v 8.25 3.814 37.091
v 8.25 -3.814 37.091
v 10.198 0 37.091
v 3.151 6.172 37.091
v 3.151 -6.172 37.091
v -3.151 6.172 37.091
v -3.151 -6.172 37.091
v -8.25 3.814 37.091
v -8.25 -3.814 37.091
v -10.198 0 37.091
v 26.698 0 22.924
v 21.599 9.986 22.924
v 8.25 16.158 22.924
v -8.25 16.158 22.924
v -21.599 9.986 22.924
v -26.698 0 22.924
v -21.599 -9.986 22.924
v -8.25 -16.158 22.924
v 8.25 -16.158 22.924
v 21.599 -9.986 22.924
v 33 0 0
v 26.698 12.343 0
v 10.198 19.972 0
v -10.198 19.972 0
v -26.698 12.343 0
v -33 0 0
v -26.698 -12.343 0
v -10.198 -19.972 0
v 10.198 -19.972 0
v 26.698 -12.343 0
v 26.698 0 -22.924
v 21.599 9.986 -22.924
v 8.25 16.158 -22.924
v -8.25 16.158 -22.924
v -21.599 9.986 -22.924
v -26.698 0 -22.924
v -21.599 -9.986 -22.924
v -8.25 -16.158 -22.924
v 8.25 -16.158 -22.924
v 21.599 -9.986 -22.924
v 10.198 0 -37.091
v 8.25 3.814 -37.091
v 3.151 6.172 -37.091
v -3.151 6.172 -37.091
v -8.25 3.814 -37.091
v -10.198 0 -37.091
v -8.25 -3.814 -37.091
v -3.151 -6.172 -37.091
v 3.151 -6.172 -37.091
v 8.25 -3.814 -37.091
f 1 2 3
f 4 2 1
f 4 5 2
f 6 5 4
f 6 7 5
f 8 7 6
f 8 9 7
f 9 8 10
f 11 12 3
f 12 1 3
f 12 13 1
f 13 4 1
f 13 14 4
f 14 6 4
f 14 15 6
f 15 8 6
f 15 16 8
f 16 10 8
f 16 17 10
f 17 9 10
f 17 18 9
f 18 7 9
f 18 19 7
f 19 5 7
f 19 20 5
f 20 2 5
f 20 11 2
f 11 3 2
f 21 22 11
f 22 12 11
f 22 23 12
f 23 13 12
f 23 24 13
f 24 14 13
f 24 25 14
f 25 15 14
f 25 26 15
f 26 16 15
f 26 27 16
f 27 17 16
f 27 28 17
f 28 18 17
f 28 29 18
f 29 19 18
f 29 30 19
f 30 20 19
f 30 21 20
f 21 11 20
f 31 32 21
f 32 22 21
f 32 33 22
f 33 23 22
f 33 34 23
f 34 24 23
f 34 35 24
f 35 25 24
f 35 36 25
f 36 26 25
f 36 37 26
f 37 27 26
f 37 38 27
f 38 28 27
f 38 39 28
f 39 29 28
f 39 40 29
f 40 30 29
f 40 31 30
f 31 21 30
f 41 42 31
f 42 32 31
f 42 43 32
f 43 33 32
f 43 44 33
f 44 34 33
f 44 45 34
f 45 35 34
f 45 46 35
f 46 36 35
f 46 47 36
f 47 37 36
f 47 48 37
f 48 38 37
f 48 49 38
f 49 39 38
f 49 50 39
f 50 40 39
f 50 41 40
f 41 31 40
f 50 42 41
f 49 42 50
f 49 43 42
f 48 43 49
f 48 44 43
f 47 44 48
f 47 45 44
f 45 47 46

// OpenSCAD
// Generated by SolidPython 1.0.1 on 2020-07-29 00:46:49


scale(v = [11, 7, 13]) {
	sphere(r = 3);
}
/***********************************************
*********      SolidPython code:      **********
************************************************
 
# import packages: SolidPython
from solid import *
from solid.utils import *
from itertools import chain, combinations, permutations


class Resize:

    def __init__(self, scad_file):
        self.scad_file = scad_file
        #self.scad_file = import_scad(scad_file)
        # cone/cylinder param:
        self.r1 = 0
        self.r2 = 0
        self.h = 0
        # rectangular prism param:
        self.w = 0
        self.l = 0
        # ellipse param:
        self.r = 0

    # import OpenScad code (file name corresponds to shape)


    # classify shape + parameters
    def assign(self, param1, param2, param3):
        if self.scad_file == 'cone.scad':
            self.r1 = param1
            self.r2 = param2
            self.h = param3
        elif self.scad_file == 'cylinder.scad':
            self.r1 = param1
            self.r2 = param2
            self.h = param3
        elif self.scad_file == 'rectangularPrism.scad':
            self.h = param1
            self.l = param2
            self.w = param3
        else:
            self.r = param1
            self.h = param2

    # resize parameters
    def iterate(self):
        x = range(3, 20, 2)
        i = 1
        if self.scad_file == 'cone.scad':
            tempList = list(permutations(x, 2))
            for temp in tempList:
                param1 = temp[0]
                param2 = temp[1]
                filepath = 'produced_scad_files/' + 'cone' + str(param1) + '_' + str(param2) + '_' + '.scad'
                scad_render_to_file(cylinder(h=param1, r1=param2, r2=0), filepath)

        elif self.scad_file == 'cylinder.scad':
            tempList = list(permutations(x, 3))
            for temp in tempList:
                param1 = temp[0]
                param2 = temp[1]
                filepath = 'produced_scad_files/' + 'cylinder' + str(param1) + '_' + str(param2) + '_' + '.scad'
                scad_render_to_file(cylinder(h=param1, r1=param2, r2=param2), filepath)

        elif self.scad_file == 'rectangularPrism.scad':
            tempList = list(permutations(x, 3))
            for temp in tempList:
                param1 = temp[0]
                param2 = temp[1]
                param3 = temp[2]
                filepath = 'produced_scad_files/' + 'rectangularPrism' + str(param1) + '_' + str(param2) + '_' + str(
                    param3) + '.scad'
                scad_render_to_file(cube(size=(param1, param2, param3)), filepath)

        elif self.scad_file == 'ellipse.scad':
            tempList = list(permutations(x, 4))
            for temp in tempList:
                param1 = temp[0]
                param2 = temp[1]
                param3 = temp[2]
                param4 = temp[3]
                filepath = 'produced_scad_files/' + 'ellipse' + str(param1) + '_' + str(param2) + '_' + str(param3) + '_' + str(param4) + '.scad'
                scad_render_to_file(scale([param1, param2, param3])(sphere(r=param4)), filepath)

    def render_to_scadfile(self):
        scad_render_to_file(scad, 'example.scad') 
 
************************************************/
